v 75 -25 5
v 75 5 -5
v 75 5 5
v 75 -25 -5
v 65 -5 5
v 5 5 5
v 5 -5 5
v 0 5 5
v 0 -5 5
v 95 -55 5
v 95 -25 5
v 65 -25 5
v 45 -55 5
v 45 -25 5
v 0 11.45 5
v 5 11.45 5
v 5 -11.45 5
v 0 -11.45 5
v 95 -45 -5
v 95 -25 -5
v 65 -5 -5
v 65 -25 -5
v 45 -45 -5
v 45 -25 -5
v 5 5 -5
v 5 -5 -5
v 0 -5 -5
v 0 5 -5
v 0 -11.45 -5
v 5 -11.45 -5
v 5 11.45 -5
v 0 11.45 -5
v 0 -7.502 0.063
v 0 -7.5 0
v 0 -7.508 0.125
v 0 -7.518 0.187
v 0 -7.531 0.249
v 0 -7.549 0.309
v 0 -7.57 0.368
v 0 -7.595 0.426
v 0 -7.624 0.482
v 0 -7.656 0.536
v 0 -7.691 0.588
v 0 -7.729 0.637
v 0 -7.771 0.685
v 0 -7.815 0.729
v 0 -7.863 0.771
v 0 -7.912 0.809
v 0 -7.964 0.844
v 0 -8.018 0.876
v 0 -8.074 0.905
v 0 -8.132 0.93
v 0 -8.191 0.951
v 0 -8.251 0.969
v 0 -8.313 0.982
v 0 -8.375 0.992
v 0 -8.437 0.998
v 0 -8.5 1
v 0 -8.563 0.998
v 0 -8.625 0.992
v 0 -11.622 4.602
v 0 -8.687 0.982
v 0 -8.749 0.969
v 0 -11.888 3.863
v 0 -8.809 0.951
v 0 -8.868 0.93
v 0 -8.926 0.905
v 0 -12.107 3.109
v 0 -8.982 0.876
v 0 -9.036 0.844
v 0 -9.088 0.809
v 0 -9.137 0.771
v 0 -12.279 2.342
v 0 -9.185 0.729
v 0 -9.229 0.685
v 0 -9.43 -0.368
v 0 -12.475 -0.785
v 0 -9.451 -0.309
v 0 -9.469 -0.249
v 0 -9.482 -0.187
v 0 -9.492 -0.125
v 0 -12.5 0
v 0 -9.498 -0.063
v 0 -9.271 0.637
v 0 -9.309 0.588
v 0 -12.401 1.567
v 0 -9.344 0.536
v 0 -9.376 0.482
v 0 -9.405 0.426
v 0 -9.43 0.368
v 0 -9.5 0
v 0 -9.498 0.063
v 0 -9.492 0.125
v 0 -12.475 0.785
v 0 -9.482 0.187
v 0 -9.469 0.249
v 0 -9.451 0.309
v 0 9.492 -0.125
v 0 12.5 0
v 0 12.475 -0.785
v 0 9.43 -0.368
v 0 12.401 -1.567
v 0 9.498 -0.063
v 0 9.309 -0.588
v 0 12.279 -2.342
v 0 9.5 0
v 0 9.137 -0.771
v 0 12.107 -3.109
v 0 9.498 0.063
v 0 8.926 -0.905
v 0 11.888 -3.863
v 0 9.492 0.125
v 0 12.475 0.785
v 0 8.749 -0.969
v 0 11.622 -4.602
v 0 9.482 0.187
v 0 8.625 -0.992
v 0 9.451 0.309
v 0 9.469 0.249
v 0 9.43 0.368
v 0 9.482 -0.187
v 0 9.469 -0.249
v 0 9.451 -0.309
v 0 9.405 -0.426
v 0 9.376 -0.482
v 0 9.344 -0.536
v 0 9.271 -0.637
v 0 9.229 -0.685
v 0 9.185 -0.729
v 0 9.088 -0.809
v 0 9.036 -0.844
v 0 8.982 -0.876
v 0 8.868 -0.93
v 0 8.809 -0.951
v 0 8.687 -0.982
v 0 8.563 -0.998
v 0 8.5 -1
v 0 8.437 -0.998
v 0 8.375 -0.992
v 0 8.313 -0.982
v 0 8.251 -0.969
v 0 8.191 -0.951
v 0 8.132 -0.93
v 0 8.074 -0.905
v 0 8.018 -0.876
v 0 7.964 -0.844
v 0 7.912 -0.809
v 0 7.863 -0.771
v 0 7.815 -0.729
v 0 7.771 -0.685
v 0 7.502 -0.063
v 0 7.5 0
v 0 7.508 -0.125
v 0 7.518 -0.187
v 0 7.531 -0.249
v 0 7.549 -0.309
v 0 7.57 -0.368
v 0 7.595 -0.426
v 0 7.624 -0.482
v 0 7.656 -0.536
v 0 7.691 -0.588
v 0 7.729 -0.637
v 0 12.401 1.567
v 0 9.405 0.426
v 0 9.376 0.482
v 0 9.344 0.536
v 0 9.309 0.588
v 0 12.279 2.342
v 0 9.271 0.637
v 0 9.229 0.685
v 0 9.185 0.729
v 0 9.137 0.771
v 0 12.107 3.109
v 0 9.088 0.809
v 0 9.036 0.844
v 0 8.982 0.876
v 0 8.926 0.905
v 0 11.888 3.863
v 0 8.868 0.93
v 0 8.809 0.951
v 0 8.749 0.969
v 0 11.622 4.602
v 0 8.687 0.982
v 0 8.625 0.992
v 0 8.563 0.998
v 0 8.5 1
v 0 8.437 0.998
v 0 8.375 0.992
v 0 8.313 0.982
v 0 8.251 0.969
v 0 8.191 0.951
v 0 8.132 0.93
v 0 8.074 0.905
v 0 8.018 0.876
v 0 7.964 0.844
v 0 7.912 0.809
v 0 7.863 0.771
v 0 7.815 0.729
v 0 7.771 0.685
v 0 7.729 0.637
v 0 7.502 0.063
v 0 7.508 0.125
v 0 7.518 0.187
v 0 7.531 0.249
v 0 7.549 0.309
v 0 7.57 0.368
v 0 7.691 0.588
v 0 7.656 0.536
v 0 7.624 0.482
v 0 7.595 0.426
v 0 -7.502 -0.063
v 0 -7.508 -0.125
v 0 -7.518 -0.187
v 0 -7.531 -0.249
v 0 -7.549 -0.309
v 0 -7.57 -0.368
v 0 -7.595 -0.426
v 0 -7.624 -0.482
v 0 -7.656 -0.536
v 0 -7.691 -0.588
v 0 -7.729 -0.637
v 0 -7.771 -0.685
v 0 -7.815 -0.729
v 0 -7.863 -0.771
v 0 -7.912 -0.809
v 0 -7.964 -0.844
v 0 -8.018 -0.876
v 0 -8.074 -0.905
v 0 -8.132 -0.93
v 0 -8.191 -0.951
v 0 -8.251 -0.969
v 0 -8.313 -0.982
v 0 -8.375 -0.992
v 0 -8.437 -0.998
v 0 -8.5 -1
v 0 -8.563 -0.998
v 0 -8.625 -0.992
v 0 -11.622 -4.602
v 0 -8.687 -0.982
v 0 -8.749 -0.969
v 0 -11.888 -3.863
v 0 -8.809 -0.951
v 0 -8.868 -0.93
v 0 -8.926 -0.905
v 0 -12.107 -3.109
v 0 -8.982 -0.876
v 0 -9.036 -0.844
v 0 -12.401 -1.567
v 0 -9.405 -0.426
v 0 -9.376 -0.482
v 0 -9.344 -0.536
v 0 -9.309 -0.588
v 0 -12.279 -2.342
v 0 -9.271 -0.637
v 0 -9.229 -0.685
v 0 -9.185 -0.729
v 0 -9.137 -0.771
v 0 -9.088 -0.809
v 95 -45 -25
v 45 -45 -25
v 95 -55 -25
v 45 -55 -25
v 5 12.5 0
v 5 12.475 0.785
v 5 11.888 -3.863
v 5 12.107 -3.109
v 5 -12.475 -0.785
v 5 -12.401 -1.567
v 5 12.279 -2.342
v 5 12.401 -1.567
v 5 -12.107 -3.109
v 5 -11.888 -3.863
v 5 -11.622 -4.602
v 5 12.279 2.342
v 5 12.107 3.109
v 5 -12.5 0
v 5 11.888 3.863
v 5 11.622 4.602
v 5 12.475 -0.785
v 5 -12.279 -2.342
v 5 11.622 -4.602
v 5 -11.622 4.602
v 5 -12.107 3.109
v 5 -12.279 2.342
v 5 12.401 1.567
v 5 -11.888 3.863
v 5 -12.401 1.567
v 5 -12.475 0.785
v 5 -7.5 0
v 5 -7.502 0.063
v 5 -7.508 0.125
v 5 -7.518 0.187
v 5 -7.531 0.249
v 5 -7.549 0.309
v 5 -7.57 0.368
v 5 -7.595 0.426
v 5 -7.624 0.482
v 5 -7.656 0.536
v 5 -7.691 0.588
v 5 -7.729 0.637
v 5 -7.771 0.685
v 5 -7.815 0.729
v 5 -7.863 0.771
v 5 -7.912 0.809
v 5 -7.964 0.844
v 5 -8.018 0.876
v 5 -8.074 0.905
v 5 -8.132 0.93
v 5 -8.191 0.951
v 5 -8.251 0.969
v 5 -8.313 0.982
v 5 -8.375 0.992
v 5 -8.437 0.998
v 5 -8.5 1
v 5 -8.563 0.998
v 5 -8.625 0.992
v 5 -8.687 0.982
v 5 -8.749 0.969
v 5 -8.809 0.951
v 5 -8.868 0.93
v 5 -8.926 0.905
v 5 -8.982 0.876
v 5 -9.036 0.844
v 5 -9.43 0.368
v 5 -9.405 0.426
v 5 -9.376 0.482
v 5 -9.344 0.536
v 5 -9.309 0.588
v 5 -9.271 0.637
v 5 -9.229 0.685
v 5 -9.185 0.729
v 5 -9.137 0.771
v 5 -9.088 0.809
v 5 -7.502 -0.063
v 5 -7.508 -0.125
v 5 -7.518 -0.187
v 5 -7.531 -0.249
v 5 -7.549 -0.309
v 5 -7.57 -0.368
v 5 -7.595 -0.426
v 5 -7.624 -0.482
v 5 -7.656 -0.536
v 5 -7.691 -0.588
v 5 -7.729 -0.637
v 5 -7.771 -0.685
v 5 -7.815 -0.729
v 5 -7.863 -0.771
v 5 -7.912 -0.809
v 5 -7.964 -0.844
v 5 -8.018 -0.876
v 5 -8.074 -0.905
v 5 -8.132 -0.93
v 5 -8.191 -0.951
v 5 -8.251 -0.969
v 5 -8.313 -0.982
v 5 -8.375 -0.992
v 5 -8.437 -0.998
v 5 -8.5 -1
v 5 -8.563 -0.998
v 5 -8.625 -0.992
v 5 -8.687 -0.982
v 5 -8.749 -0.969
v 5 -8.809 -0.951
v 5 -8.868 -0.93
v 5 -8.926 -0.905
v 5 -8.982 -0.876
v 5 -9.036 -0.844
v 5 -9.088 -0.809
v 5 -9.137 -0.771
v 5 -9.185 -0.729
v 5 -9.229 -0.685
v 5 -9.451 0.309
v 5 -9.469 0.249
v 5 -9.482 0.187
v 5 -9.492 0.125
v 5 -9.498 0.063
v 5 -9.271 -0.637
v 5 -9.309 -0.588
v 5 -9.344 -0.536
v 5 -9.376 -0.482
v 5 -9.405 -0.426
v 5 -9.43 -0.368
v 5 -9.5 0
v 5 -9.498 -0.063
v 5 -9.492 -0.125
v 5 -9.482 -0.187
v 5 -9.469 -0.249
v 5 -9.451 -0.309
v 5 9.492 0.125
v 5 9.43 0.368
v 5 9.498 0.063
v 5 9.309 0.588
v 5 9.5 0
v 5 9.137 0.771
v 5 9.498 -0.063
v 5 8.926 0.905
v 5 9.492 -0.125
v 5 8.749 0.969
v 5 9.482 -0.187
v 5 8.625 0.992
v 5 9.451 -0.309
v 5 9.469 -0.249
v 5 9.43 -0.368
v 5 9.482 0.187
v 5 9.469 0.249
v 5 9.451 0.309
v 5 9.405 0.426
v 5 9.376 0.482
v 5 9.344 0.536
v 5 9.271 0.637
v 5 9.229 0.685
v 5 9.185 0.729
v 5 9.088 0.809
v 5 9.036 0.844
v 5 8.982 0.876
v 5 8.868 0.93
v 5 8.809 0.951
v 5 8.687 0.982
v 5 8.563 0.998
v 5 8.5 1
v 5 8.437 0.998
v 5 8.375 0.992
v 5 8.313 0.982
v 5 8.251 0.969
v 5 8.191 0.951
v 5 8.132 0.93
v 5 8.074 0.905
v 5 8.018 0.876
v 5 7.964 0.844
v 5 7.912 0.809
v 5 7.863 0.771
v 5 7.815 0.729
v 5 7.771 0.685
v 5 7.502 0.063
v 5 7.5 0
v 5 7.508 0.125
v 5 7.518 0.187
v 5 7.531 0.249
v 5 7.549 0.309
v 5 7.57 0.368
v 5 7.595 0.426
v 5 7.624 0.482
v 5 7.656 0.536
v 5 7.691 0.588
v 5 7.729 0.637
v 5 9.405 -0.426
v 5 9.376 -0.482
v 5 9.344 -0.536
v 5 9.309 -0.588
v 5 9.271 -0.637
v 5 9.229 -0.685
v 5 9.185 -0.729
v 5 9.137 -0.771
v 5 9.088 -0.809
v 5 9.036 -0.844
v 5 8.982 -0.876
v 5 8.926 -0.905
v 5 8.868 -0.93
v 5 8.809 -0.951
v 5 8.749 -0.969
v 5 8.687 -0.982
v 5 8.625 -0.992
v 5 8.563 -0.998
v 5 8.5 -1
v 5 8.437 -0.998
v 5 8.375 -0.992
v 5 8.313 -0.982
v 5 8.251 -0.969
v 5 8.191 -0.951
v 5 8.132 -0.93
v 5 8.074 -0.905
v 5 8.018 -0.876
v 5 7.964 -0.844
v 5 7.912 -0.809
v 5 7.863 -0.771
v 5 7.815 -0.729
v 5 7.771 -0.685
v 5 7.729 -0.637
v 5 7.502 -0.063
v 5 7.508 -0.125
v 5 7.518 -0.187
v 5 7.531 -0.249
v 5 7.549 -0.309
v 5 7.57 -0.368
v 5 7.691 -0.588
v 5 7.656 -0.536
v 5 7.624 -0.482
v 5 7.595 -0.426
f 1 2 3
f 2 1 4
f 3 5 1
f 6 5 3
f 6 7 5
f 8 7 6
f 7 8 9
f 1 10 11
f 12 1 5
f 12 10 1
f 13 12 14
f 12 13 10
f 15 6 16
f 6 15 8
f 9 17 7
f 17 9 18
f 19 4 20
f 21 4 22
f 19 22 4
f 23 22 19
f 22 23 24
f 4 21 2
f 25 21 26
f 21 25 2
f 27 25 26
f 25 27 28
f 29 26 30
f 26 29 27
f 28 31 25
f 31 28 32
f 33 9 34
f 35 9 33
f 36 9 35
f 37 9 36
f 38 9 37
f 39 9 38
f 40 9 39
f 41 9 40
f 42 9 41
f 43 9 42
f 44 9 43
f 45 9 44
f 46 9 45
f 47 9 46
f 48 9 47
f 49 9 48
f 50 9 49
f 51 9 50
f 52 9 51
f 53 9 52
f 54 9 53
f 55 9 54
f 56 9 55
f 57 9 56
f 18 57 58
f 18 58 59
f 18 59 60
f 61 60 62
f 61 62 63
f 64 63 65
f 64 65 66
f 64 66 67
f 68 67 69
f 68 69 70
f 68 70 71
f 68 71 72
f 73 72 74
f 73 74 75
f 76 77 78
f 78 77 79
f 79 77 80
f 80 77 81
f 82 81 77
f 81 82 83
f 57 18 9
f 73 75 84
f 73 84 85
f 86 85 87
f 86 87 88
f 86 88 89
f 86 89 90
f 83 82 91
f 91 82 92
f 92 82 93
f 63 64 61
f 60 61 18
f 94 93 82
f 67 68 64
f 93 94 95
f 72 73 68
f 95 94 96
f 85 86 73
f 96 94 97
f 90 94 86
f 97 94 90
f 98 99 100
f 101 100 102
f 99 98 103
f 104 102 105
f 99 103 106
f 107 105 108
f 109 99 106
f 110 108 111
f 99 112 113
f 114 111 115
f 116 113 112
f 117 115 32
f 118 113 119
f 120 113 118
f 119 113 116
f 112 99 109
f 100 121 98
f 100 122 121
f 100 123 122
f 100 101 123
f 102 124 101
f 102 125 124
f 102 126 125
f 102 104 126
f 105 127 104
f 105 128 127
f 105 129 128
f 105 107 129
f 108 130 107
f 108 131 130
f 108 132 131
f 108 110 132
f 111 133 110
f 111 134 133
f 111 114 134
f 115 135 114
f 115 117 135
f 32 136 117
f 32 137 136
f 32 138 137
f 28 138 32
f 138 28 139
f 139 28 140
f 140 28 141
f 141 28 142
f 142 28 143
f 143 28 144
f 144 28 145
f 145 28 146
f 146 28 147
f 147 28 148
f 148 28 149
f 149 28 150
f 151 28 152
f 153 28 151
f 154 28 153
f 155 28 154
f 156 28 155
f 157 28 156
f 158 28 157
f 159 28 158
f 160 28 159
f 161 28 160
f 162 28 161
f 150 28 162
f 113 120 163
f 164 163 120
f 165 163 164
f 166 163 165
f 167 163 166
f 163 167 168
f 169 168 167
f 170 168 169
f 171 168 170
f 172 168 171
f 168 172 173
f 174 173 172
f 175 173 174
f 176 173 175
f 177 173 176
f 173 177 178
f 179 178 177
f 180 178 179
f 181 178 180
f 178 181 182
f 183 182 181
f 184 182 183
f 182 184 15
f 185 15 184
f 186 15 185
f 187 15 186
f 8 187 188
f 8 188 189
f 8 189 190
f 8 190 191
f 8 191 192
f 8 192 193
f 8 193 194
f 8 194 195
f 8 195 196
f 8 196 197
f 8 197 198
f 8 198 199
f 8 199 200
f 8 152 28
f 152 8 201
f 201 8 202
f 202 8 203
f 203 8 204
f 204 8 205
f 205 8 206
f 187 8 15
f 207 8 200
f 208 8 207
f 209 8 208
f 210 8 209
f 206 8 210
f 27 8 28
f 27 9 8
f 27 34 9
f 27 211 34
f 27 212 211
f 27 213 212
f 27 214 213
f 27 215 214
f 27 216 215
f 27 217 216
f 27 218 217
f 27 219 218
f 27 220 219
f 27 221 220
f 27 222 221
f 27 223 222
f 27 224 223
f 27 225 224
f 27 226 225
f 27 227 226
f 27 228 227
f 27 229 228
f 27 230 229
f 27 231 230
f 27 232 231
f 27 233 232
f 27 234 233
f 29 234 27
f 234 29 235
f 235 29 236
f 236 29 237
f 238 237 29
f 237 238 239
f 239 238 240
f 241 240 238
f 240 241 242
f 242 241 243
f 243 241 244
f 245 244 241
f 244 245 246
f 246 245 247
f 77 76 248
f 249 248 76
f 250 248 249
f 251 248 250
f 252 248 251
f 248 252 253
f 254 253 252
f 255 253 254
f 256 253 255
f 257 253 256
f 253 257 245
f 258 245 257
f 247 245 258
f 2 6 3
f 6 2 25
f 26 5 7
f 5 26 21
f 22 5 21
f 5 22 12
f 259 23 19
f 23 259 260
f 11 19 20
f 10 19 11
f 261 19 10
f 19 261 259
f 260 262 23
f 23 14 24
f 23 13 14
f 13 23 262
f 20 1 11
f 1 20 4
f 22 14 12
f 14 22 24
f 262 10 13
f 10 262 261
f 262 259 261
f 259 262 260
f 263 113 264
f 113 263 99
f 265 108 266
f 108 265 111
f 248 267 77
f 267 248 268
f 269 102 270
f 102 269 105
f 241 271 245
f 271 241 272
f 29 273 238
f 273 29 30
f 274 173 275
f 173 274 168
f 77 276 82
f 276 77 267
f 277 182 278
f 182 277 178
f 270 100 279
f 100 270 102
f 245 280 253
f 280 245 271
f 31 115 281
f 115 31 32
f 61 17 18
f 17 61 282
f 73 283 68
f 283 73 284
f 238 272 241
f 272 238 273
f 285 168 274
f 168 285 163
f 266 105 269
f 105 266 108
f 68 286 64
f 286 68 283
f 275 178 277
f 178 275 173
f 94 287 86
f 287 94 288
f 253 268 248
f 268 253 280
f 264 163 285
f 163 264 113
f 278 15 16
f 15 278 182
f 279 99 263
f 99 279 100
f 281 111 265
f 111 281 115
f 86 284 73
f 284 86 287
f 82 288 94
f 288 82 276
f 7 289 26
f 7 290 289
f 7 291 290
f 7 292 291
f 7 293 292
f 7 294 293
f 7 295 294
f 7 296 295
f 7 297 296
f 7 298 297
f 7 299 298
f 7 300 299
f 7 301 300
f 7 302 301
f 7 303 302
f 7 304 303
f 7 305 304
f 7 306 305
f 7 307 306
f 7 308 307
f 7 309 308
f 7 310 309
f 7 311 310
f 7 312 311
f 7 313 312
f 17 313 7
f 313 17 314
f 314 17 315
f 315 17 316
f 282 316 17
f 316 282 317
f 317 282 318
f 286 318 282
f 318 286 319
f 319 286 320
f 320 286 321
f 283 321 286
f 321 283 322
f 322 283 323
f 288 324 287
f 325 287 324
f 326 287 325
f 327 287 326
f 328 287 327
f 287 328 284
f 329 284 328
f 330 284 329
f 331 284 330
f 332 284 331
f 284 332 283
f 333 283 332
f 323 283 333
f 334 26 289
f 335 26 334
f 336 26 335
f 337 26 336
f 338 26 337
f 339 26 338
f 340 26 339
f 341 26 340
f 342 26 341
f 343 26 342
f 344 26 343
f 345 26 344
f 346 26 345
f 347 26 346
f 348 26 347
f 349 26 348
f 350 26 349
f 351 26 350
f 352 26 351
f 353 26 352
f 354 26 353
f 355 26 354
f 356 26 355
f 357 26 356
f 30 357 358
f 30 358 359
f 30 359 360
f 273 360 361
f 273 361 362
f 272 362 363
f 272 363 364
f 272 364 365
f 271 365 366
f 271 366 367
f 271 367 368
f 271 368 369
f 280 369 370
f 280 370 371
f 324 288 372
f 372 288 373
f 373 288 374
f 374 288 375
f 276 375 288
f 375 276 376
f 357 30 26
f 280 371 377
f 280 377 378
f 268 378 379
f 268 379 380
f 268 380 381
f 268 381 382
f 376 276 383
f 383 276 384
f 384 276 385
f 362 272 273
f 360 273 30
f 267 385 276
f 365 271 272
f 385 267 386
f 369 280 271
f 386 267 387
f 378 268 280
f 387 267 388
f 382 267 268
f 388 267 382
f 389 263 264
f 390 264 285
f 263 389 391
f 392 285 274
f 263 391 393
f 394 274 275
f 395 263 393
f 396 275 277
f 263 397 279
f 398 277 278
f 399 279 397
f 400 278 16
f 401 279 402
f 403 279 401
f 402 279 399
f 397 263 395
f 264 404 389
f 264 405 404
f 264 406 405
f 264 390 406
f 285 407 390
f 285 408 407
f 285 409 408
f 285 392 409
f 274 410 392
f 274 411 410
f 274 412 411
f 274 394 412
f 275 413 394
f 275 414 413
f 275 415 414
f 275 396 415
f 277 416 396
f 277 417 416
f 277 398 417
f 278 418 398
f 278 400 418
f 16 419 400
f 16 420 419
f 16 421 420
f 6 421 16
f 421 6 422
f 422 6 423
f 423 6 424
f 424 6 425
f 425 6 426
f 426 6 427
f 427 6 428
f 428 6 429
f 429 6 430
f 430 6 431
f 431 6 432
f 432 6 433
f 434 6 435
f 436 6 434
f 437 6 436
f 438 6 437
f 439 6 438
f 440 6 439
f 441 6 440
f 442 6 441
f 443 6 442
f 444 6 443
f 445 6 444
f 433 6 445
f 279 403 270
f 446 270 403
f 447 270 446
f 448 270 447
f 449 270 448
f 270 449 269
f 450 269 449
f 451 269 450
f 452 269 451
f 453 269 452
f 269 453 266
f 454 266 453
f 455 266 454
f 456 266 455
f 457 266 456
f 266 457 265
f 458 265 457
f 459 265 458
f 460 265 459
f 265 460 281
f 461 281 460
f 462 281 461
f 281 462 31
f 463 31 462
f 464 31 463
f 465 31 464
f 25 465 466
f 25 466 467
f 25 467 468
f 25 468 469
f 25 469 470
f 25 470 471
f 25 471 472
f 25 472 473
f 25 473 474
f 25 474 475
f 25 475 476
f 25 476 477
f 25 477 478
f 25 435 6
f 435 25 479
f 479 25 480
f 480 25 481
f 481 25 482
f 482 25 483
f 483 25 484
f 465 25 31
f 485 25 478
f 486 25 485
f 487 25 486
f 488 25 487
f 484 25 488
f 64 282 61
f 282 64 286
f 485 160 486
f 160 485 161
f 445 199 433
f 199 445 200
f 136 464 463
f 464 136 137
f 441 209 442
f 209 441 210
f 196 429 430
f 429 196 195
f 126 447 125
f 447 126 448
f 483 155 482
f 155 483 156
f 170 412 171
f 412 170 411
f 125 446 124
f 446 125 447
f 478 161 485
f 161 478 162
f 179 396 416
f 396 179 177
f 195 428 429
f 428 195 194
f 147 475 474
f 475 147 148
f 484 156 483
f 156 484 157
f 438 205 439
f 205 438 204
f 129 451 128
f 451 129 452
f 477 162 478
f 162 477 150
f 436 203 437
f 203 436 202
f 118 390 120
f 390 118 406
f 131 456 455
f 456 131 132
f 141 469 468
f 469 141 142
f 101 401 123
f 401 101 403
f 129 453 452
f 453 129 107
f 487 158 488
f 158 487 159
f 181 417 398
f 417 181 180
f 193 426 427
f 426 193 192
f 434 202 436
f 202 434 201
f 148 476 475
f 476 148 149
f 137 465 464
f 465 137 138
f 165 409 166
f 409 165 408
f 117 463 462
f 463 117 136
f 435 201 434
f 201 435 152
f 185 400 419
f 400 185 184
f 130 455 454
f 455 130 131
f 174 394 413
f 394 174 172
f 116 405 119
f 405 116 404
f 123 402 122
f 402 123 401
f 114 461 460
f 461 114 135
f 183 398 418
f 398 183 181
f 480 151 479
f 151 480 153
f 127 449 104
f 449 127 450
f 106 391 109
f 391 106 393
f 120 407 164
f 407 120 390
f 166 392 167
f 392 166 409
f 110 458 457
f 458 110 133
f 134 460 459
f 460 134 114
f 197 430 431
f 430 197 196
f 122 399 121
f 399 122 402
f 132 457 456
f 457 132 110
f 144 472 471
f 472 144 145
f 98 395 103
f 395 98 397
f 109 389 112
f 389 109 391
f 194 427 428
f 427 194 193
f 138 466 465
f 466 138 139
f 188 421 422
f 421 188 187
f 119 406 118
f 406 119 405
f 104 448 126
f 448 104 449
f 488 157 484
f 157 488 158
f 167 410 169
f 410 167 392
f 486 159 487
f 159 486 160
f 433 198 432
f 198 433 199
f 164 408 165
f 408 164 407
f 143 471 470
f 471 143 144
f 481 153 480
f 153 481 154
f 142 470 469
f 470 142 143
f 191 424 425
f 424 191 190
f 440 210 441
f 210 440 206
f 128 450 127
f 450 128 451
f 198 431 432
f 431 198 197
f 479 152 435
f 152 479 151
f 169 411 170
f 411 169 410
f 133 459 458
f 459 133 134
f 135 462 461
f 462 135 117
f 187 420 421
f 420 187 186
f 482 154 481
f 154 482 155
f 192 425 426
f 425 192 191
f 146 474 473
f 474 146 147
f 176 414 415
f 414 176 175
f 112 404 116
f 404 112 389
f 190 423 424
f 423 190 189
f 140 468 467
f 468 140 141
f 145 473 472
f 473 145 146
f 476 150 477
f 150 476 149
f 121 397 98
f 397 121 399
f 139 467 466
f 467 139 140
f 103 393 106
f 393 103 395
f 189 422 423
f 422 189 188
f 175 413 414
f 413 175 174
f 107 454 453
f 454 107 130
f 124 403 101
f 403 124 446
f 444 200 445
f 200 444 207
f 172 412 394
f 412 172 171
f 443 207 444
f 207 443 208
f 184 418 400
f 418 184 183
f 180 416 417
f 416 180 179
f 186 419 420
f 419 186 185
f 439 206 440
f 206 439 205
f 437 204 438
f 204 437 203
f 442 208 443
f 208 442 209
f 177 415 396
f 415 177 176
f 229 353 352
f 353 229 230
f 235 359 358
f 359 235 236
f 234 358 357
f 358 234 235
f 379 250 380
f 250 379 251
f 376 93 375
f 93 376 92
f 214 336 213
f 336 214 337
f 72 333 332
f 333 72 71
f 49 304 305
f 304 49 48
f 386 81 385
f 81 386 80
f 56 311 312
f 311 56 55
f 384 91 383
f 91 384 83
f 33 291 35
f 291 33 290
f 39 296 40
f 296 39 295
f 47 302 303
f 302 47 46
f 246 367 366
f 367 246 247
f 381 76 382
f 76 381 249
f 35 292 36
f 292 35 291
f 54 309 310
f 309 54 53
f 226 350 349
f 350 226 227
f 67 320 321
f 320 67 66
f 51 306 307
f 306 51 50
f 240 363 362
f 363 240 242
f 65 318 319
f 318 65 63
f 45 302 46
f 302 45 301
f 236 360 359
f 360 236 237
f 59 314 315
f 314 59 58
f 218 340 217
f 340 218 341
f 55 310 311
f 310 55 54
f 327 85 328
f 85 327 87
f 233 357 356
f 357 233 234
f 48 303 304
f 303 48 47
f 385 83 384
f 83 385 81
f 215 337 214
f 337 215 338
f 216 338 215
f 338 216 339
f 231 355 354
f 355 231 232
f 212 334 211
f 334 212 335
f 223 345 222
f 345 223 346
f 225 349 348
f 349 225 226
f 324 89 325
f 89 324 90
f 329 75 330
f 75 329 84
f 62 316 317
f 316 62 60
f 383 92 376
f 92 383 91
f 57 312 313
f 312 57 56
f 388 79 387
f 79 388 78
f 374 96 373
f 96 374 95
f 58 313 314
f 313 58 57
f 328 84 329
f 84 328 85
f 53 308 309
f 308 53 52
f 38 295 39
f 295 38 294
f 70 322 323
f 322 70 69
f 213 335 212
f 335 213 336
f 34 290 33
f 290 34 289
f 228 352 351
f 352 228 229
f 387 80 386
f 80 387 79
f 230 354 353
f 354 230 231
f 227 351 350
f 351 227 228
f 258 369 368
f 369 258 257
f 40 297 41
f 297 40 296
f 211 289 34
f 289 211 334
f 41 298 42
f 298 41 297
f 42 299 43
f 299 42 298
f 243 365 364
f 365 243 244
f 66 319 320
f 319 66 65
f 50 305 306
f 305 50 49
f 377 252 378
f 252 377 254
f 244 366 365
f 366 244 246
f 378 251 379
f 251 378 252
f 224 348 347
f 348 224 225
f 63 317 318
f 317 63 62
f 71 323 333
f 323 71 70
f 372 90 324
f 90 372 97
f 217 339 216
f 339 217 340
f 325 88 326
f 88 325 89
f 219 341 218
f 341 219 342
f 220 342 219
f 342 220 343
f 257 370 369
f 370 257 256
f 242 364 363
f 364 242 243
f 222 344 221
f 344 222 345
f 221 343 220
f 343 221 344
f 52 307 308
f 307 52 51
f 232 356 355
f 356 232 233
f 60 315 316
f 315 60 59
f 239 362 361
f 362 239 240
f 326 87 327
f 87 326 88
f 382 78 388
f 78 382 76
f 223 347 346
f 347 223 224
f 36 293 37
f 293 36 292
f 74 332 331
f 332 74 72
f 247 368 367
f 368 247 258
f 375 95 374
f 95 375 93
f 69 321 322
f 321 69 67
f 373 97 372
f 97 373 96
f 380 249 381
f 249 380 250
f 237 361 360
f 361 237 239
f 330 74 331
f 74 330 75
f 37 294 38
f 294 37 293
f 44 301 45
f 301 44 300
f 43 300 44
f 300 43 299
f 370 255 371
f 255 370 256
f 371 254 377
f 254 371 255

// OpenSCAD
$fn=100;

module bras()
{
	translate([0,-5,-5]) cube([75,10,10]); //bras principal
	translate([65,-45,5]) rotate([0,90,0]) cube([10,40,10]); //bras secondaire
	translate([45,-45,5]) rotate([0,90,0]) cube([10,20,50]);
	translate([45,-45,-25]) rotate([90,0,0]) cube([50,30,10]);
	

	
	
}

module vis()
{
	rotate([0,90,0]) translate([0,8.5,0]) cylinder(d=2, h=10);
	rotate([0,90,0]) translate([0,-8.5,0]) cylinder(d=2, h=10);
}

module base()
{
	difference()
	{
		rotate([0,90,0]) cylinder(d=25,h=5);
		translate([-5,-12.5,5]) cube([15,25,10]);
		translate([-5,-12.5,-15]) cube([15,25,10]);
	}
}


difference () 
{
	union() 
	{
		bras();
		base();
	}
	vis();
}
